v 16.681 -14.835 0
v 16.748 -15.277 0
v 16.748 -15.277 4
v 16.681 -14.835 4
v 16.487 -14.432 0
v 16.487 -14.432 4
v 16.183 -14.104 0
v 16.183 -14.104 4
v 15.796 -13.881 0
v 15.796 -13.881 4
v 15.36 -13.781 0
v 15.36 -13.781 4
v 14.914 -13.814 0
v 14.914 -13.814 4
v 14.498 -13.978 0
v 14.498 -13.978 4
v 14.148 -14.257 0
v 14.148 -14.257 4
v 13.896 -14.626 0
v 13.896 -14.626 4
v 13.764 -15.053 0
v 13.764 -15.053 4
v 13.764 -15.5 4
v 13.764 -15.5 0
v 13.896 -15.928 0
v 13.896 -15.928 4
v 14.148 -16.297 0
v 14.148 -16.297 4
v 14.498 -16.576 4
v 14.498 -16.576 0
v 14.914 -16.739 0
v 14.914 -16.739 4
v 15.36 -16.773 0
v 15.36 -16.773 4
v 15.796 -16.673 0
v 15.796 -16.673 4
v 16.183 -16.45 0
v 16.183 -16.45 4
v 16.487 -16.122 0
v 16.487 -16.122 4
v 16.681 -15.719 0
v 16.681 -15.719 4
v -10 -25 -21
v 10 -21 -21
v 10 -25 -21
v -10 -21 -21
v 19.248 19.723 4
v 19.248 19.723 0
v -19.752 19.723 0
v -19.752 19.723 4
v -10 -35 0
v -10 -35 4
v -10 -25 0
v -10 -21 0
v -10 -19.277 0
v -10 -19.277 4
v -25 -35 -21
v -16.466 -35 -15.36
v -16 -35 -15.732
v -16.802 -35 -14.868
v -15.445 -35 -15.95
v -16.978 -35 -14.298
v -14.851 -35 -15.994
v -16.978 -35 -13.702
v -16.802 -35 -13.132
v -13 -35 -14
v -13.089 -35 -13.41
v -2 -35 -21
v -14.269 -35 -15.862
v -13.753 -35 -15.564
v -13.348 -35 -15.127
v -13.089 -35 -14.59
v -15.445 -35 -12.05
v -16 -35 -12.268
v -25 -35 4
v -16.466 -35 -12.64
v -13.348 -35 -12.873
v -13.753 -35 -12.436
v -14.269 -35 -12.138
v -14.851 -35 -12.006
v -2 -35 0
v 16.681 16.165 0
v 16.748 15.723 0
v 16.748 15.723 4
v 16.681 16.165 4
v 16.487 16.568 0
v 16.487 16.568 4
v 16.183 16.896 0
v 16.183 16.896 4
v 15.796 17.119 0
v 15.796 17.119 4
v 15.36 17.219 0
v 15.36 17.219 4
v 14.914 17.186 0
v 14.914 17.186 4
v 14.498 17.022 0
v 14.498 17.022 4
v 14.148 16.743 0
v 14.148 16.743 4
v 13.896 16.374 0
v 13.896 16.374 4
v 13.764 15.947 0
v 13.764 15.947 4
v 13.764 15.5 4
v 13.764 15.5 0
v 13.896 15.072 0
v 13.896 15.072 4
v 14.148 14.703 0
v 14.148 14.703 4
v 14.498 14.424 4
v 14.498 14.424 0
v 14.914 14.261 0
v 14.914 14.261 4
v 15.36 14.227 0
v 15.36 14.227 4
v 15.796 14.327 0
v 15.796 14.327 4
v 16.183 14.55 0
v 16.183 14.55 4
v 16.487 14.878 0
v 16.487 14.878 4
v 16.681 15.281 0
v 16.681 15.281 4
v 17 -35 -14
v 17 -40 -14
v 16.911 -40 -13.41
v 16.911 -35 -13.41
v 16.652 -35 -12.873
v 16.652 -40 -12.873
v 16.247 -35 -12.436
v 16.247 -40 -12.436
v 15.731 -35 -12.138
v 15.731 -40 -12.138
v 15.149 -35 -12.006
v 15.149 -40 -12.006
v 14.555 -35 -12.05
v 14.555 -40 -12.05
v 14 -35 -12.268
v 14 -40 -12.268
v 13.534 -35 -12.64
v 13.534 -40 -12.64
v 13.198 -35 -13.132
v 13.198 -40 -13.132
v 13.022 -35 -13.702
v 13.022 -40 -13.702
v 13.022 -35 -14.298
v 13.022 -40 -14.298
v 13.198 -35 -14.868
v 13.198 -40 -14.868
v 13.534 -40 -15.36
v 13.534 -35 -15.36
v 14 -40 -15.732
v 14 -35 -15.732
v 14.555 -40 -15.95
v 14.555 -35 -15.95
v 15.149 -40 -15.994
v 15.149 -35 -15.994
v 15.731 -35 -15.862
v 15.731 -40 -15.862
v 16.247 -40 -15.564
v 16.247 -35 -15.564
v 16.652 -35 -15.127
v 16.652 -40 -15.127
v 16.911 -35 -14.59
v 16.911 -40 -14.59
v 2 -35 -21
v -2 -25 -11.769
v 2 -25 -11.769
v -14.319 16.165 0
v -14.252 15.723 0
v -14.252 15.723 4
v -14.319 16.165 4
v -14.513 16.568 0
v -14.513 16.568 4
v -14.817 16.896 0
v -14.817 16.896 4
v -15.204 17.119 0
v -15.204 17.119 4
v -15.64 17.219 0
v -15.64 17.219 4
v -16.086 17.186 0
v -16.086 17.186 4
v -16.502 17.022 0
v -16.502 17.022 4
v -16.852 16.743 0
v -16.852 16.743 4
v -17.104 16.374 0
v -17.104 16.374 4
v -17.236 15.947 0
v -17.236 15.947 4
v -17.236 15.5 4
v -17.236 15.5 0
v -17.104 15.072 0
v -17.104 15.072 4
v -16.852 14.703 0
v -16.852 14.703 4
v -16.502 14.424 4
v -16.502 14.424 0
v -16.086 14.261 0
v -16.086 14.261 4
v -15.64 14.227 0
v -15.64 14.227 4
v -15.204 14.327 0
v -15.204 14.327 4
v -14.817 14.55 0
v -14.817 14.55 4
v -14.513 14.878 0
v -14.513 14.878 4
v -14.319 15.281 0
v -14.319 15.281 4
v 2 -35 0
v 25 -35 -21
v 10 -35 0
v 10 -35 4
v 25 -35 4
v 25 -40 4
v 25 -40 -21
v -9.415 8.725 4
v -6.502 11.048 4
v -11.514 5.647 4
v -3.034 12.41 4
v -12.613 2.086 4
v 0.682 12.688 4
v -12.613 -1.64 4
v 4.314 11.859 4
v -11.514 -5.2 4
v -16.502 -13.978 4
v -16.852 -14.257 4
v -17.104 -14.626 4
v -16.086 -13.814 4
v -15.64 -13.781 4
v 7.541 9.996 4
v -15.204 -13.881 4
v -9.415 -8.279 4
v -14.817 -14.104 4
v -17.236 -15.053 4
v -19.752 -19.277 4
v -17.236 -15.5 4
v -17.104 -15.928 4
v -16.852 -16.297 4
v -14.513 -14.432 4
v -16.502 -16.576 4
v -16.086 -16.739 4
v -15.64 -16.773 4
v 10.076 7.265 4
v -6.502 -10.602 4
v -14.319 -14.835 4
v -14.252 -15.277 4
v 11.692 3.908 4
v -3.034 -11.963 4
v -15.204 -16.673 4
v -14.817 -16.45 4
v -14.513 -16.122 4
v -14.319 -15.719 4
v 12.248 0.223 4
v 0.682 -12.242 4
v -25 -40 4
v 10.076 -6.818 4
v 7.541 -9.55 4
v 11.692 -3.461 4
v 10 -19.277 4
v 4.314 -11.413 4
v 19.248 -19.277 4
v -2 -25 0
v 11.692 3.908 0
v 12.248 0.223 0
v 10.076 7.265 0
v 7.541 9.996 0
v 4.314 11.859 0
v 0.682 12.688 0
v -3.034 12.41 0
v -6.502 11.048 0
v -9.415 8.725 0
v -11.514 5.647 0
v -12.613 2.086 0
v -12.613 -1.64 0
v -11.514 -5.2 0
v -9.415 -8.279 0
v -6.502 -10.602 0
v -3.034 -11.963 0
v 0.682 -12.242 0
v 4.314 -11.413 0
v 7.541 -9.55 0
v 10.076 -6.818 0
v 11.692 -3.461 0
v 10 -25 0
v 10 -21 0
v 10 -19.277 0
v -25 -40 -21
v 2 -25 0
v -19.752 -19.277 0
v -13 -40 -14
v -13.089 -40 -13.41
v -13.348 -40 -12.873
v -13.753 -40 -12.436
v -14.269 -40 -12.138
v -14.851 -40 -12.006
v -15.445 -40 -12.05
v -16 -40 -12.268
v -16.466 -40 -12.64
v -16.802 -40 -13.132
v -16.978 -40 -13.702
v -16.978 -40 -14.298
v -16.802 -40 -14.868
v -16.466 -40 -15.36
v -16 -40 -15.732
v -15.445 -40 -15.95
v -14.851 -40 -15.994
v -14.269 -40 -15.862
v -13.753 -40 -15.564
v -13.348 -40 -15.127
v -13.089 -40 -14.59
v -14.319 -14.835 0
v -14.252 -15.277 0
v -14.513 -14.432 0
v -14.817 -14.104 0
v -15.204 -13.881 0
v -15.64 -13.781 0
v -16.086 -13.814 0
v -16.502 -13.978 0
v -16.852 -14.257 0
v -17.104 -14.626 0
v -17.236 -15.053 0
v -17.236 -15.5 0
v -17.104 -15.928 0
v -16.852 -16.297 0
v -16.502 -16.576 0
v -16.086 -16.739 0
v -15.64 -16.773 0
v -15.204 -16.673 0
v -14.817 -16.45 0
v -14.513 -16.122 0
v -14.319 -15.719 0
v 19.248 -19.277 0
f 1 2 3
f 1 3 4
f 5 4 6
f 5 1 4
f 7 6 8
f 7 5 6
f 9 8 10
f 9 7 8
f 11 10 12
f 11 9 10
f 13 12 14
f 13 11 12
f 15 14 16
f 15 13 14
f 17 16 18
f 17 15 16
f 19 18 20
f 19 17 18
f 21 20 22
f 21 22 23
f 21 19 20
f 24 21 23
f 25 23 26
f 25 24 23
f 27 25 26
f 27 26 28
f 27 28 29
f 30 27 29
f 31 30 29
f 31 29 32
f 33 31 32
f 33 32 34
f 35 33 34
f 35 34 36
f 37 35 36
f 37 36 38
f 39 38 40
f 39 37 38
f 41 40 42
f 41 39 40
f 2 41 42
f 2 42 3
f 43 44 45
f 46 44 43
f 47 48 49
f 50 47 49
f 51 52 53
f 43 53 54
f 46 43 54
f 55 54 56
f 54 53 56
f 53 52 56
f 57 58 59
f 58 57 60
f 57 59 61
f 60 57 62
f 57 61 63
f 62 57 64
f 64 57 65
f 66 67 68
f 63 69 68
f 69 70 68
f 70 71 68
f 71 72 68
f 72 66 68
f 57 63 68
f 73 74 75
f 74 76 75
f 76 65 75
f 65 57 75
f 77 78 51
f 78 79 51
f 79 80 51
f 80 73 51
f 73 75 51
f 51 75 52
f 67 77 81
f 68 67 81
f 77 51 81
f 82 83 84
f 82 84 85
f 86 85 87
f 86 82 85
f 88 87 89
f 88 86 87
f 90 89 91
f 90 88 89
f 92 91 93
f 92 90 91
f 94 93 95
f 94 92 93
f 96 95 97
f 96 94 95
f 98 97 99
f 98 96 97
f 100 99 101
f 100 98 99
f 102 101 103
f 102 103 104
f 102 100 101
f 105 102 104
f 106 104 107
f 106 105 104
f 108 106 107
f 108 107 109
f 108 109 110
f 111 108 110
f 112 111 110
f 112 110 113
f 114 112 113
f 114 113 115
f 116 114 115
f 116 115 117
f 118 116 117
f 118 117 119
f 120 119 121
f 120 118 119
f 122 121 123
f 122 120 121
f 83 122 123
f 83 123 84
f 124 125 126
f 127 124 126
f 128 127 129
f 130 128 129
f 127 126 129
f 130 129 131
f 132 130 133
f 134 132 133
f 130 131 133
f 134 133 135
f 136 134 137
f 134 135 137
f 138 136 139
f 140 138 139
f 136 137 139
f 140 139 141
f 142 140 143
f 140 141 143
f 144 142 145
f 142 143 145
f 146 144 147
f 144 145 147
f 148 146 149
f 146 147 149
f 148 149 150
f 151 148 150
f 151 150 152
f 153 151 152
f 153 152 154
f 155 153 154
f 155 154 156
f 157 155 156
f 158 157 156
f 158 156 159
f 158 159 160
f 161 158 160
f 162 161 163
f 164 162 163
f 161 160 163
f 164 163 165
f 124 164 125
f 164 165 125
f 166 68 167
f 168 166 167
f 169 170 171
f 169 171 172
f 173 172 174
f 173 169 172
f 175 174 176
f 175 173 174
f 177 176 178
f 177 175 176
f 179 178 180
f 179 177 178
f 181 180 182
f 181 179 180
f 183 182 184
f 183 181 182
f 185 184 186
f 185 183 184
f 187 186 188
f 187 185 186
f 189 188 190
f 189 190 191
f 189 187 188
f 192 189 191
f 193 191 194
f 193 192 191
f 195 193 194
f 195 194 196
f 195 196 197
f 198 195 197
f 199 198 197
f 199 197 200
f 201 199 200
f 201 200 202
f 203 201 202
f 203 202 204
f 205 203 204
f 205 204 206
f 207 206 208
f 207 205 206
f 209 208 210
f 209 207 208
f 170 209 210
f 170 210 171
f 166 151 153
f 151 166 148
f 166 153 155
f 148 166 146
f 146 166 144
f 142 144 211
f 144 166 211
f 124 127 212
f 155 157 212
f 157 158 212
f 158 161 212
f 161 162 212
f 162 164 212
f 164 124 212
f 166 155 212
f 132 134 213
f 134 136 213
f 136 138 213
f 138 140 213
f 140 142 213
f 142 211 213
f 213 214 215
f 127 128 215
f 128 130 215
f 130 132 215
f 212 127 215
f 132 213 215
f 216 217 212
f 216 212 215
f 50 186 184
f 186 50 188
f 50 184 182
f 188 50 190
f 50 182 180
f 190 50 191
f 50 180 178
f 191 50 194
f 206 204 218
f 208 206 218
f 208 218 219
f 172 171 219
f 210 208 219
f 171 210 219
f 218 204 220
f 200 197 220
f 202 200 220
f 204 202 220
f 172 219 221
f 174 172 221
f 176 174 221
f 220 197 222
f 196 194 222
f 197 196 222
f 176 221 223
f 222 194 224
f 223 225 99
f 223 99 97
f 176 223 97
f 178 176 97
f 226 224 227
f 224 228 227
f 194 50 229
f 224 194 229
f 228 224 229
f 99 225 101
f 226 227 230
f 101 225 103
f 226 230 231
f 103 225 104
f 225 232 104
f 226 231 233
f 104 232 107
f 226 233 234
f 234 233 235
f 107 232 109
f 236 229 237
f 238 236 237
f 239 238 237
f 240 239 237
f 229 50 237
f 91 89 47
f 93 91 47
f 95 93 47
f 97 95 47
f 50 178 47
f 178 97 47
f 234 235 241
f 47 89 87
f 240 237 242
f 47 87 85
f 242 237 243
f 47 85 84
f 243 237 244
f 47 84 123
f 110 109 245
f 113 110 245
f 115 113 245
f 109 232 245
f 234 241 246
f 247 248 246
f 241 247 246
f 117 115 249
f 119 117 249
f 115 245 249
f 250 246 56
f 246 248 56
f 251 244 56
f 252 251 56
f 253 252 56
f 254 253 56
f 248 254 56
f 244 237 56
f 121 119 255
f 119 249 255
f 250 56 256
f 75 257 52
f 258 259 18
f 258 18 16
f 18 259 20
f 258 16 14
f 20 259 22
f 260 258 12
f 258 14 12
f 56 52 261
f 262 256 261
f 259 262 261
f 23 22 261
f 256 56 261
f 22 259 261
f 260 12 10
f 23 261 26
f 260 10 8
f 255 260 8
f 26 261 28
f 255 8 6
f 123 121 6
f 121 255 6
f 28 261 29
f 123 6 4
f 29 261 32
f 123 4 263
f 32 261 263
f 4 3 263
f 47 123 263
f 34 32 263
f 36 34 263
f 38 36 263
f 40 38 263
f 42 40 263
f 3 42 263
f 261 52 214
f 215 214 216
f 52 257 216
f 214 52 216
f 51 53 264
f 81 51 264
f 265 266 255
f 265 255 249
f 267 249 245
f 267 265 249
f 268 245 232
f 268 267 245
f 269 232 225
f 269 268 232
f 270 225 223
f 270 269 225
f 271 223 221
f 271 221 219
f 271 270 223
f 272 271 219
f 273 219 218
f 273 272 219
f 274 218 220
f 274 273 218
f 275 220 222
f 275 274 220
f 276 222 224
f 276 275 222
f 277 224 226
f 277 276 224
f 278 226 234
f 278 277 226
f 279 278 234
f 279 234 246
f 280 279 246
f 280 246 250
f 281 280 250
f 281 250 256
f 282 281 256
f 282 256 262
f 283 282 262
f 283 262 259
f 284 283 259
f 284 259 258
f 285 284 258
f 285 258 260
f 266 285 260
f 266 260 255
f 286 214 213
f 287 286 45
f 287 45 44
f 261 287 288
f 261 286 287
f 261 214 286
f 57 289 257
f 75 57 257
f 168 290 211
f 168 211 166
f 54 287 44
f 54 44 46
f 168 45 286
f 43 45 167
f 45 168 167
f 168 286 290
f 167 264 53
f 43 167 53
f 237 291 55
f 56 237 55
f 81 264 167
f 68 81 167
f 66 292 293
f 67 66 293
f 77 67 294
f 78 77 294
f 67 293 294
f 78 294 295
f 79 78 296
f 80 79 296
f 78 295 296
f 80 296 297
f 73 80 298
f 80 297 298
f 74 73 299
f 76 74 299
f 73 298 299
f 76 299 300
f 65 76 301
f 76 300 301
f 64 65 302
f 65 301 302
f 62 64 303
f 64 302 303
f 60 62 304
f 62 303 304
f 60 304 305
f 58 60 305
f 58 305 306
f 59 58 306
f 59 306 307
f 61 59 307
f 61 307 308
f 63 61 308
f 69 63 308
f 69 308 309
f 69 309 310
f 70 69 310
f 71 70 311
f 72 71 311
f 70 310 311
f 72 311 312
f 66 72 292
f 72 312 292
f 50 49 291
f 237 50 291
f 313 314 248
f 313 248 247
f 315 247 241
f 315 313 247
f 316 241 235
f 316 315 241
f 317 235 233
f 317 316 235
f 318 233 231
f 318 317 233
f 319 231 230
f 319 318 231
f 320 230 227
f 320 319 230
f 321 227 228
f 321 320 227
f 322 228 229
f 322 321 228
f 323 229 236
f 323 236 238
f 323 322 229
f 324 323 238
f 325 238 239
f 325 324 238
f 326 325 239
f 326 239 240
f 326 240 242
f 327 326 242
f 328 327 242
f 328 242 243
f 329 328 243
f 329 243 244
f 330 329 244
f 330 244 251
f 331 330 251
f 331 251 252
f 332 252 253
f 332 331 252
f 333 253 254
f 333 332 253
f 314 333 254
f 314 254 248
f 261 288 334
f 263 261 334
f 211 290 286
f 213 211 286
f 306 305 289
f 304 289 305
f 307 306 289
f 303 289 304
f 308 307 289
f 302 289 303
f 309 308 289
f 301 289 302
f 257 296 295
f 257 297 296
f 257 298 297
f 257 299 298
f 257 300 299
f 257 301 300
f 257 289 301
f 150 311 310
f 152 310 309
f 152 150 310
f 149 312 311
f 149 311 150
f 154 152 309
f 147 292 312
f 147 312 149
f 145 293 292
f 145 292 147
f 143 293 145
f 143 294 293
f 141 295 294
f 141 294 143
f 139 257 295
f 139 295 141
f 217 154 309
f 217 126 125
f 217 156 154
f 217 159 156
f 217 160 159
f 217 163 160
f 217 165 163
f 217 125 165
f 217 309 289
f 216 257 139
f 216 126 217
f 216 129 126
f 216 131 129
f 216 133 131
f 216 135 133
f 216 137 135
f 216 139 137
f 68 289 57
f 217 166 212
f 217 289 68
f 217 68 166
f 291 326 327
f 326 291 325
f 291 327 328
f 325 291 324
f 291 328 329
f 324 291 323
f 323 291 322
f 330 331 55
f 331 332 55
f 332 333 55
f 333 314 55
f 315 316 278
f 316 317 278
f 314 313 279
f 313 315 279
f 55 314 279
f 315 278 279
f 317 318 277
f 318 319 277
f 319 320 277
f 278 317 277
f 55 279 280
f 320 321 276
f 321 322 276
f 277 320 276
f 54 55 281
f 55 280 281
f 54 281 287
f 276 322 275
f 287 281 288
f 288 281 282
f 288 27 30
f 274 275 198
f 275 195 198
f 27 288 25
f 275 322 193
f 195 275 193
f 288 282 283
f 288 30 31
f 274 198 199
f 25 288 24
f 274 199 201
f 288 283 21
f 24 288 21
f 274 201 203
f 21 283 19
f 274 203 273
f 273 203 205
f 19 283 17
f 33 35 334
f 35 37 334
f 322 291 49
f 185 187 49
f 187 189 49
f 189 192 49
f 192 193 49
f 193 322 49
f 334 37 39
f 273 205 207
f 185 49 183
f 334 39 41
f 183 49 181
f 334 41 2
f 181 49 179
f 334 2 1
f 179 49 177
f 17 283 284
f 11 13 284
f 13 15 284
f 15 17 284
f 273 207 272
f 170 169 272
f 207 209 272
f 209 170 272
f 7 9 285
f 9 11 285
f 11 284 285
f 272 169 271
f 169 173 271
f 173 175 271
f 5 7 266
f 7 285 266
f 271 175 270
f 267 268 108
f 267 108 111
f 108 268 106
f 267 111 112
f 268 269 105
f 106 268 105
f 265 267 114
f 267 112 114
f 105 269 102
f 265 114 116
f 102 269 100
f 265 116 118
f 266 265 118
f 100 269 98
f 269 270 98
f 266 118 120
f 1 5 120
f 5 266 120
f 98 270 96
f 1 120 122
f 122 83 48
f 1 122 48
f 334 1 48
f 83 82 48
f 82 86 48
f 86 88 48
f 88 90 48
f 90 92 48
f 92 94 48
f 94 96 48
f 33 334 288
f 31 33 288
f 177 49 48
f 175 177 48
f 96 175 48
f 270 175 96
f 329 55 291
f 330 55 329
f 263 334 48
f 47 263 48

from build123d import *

# Parameters (mm, degrees)
SKETCH1_R                = 1.5
SKETCH1_R_2              = 12.5
BOSS_EXTRUDE1_DEPTH      = 4
SKETCH2_W                = 50
SKETCH2_H                = 25
SKETCH2_R                = 2
BOSS_EXTRUDE2_DEPTH      = 5
BOSS_EXTRUDE3_DEPTH      = 2
BOSS_EXTRUDE3_DEPTH_BACK = 2
SKETCH6_W                = 42
SKETCH6_H                = 42
CUT_EXTRUDE1_DEPTH       = 52.633322574
SKETCH6_3_W              = 20
SKETCH6_3_H              = 4
BOSS_EXTRUDE4_DEPTH      = 21


with BuildPart() as part:
    # Sketch1 → Boss-Extrude1 (new body)
    with BuildSketch(Plane.XY):
        Polygon((19.247712685, -19.276828776), (19.247712685, 19.723171224), (-19.752287315, 19.723171224), (-19.752287315, -19.276828776), (-10, -19.276828776), (-10, -40), (10, -40), (10, -19.276828776), align=None)
        with Locations((-15.752287315, 15.723171224)):
            Circle(SKETCH1_R, mode=Mode.SUBTRACT)
        with Locations((-15.752287315, -15.276828776)):
            Circle(SKETCH1_R, mode=Mode.SUBTRACT)
        with Locations((-0.252287315, 0.223171224)):
            Circle(SKETCH1_R_2, mode=Mode.SUBTRACT)
        with Locations((15.247712685, -15.276828776)):
            Circle(SKETCH1_R, mode=Mode.SUBTRACT)
        with Locations((15.247712685, 15.723171224)):
            Circle(SKETCH1_R, mode=Mode.SUBTRACT)
    extrude(amount=BOSS_EXTRUDE1_DEPTH)

    # Sketch2 → Boss-Extrude2 (add)
    with BuildSketch(Plane.XZ.offset(40)):
        with Locations((0, -8.5)):
            Rectangle(SKETCH2_W, SKETCH2_H)
        with Locations((-15, -14)):
            Circle(SKETCH2_R, mode=Mode.SUBTRACT)
        with Locations((15, -14)):
            Circle(SKETCH2_R, mode=Mode.SUBTRACT)
    extrude(amount=-BOSS_EXTRUDE2_DEPTH)

    # Sketch5 → Boss-Extrude3 (add, two sides: drawn at the far end of the back side and taken through both)
    with BuildSketch(Plane(origin=(0, 0, 0), x_dir=(0, 0, -1), z_dir=(1, 0, 0)).offset(-BOSS_EXTRUDE3_DEPTH_BACK)):
        Polygon((21, -35), (0, -12.250562953), (0, -35), align=None)
    extrude(amount=BOSS_EXTRUDE3_DEPTH + BOSS_EXTRUDE3_DEPTH_BACK)

    # Sketch6 → Cut-Extrude1 (cut, through all)
    with BuildSketch(Plane(origin=(0, 0, 0), x_dir=(-1, 0, 0), z_dir=(0, 0, -1))):
        Rectangle(SKETCH6_W, SKETCH6_H)
    extrude(amount=CUT_EXTRUDE1_DEPTH, mode=Mode.SUBTRACT)

    # Sketch6<3> → Boss-Extrude4 (add, through all)
    with BuildSketch(Plane(origin=(0, 0, 0), x_dir=(-1, 0, 0), z_dir=(0, 0, -1))):
        with Locations((0, -23)):
            Rectangle(SKETCH6_3_W, SKETCH6_3_H)
    extrude(amount=BOSS_EXTRUDE4_DEPTH)


solid = part.part
